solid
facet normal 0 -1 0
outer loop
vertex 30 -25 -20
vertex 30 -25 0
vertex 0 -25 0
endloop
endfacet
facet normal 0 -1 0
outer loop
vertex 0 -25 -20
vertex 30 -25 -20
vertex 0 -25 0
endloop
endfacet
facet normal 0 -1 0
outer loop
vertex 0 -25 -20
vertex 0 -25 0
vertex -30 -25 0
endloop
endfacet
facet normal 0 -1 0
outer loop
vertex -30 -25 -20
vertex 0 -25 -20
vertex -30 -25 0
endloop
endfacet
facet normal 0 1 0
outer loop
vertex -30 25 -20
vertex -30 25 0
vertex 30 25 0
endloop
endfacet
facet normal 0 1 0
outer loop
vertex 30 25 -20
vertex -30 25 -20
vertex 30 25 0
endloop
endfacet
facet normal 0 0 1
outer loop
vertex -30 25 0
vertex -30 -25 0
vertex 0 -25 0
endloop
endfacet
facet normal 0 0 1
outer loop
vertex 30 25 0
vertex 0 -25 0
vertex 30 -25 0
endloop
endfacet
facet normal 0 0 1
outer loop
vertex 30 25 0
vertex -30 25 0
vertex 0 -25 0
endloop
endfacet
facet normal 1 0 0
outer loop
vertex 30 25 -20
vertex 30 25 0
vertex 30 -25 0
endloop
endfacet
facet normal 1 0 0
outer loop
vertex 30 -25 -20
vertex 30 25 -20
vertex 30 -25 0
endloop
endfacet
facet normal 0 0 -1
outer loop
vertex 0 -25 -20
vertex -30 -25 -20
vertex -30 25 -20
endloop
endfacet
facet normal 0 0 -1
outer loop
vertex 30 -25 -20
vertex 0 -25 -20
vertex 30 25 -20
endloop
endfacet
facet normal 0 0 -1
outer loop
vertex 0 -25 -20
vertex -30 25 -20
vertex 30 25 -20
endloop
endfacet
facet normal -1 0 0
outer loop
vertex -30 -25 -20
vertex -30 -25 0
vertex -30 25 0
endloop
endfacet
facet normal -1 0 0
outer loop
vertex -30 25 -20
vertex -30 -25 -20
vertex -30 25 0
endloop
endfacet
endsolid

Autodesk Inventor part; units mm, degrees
ref_plane "YZ Plane" through (0, 0, 0) normal (1, 0, 0) x (0, 1, 0)
ref_plane "XZ Plane" through (0, 0, 0) normal (0, 1, 0) x (-1, 0, 0)
ref_plane "XY Plane" through (0, 0, 0) normal (0, 0, 1) x (1, 0, 0)
sketch "Skizze1" plane through (0, 0, 0) normal (0, 0, 1) x (1, 0, 0)
  line L0 (-30, 25) -> (30, 25)
  line L1 (30, 25) -> (30, -25)
  line L2 (30, -25) -> (-30, -25)
  line L3 (-30, -25) -> (-30, 25)
  line L4 (0, -25) -> (0, 10.197)
  point P0 (0, 0)
  point P1 (-30, 0)
  point P2 (0, 25)
  dimension "d0" = 60
  dimension "d1" = 50
extrude "Extrusion1" add sketch "Skizze1" against normal blind 20
sketch "Skizze2" plane through (0, 0, 0) normal (0, 0, 1) x (1, 0, 0)
  line L0 (30, -25) -> (-30, -25) projected
  line L1 (0, -25) -> (0, 10.197)
  circle A0 centre (0, 10.197) radius 5
  point P0 (0, 0)
  dimension "d6" = 35.197
  dimension "d8" = 10
sketch "Skizze3" plane through (0, 0, -20) normal (0, 0, -1) x (-1, 0, 0)
  line L0 (-30, -25) -> (30, -25) projected
  line L1 (0, -25) -> (0, 10.197)
  circle A0 centre (0, 10.197) radius 5
  point P0 (0, 0)
  dimension "d7" = 35.197
  dimension "d9" = 10
sketch "Skizze4" plane through (-30, 25, 0) normal (0, 1, 0) x (1, 0, 0)
  line L0 (16.6068, 7.4409) -> (69.3206, 7.4409) construction
  line L1 (69.3206, 7.4409) -> (69.3206, -2.9881) construction
  line L2 (69.3206, -2.9881) -> (16.6068, -2.9881) construction
  line L3 (16.6068, -2.9881) -> (16.6068, 7.4409) construction
  point P0 (30, 0)
properties part number "Wechselmotor"
